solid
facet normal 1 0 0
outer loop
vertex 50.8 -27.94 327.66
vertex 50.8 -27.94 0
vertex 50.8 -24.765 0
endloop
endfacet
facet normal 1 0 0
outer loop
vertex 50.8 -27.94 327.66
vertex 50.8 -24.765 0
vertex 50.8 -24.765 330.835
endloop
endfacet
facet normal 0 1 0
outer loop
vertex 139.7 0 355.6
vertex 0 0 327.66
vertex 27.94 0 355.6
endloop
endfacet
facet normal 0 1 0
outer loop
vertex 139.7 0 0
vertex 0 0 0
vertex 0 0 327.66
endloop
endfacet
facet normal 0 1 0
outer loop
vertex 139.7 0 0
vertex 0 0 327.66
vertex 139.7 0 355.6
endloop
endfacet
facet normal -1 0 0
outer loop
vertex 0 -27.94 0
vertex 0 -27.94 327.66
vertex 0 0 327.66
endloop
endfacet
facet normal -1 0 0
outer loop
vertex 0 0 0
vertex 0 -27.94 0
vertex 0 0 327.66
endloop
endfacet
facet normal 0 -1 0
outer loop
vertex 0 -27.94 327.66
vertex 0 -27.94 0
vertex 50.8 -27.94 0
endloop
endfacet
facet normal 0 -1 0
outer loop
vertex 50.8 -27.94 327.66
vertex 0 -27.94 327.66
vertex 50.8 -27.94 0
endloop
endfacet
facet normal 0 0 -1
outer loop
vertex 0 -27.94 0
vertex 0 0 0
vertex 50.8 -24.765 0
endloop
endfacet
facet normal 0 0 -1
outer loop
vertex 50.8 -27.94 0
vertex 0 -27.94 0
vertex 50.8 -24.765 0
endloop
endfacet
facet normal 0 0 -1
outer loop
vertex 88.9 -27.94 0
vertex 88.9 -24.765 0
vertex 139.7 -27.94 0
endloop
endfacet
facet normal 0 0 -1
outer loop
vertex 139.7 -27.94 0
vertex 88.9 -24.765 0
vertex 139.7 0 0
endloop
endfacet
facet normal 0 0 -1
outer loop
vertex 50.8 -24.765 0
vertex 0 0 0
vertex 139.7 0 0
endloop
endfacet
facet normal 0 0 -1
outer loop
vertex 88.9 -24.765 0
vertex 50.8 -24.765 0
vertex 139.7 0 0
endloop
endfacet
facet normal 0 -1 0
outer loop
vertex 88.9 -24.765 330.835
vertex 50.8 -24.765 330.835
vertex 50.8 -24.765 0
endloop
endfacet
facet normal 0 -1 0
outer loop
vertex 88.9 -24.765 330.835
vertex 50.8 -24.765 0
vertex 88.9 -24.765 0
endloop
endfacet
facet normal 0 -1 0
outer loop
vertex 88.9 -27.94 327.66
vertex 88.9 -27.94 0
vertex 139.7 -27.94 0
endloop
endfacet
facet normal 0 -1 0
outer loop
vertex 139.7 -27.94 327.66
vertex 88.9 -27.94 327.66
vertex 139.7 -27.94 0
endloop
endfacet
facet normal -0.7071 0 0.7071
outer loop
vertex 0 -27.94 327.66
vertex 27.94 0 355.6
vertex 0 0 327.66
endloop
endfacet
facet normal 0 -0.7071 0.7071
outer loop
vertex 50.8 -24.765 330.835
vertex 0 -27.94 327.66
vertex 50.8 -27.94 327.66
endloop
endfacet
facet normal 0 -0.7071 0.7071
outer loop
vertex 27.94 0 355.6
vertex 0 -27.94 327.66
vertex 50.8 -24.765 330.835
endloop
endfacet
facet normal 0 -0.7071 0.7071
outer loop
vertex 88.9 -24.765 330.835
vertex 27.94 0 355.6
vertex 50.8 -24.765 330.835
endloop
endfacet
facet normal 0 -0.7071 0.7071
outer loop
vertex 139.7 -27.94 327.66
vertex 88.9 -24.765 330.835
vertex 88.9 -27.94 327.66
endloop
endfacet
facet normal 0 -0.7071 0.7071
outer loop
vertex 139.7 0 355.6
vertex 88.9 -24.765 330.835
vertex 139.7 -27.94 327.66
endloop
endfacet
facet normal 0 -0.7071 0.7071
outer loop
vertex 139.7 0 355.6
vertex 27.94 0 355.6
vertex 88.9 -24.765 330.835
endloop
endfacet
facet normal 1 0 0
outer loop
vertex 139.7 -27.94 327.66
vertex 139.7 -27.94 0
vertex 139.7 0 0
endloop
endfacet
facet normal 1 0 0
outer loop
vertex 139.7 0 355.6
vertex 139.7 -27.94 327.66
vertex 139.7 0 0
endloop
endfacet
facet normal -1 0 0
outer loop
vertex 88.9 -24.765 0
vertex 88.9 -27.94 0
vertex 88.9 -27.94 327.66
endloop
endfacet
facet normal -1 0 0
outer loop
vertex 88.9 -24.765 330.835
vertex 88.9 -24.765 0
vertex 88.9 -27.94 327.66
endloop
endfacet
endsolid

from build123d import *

# Parameters (mm, degrees)
F0_W     = 139.7
F0_H     = 27.94
F1_DEPTH = 355.6
F2_SIZE  = 27.93999
F3_W     = 38.1
F3_H     = 355.6
F4_DEPTH = 3.175
F6_DEPTH = 38.1


# Not quite as in the source:
# - a fillet or chamfer is up to 0.001 mm smaller than in the source, because OpenCascade refuses the exact size


with BuildPart() as f1:
    # F0 (on Top) → F1 (new body)
    with BuildSketch(Plane.XY):
        with Locations((69.85, -13.97)):
            Rectangle(F0_W, F0_H)
    extrude(amount=F1_DEPTH)

    # F2 (size 27.94 in the source; OpenCascade refuses exactly that, so slightly less here)
    f2_edges = [f1.edges().sort_by_distance(p)[0] for p in [
        (69.85, -27.94, 355.6),
    ]]
    chamfer(f2_edges, length=F2_SIZE)

    # F3 (on face) → F4 (cut)
    with BuildSketch(Plane.XZ.offset(27.94)):
        with Locations((69.85, 177.8)):
            Rectangle(F3_W, F3_H)
    extrude(amount=-F4_DEPTH, mode=Mode.SUBTRACT)

    # F5 (on face) → F6 (cut)
    with BuildSketch(Plane(origin=(0, 0, 0), x_dir=(-1, 0, 0), z_dir=(0, 1, 0))):
        Polygon((0, 327.66), (0, 355.6), (-27.94, 355.6), align=None)
    extrude(amount=-F6_DEPTH, mode=Mode.SUBTRACT)


solid = f1.part
